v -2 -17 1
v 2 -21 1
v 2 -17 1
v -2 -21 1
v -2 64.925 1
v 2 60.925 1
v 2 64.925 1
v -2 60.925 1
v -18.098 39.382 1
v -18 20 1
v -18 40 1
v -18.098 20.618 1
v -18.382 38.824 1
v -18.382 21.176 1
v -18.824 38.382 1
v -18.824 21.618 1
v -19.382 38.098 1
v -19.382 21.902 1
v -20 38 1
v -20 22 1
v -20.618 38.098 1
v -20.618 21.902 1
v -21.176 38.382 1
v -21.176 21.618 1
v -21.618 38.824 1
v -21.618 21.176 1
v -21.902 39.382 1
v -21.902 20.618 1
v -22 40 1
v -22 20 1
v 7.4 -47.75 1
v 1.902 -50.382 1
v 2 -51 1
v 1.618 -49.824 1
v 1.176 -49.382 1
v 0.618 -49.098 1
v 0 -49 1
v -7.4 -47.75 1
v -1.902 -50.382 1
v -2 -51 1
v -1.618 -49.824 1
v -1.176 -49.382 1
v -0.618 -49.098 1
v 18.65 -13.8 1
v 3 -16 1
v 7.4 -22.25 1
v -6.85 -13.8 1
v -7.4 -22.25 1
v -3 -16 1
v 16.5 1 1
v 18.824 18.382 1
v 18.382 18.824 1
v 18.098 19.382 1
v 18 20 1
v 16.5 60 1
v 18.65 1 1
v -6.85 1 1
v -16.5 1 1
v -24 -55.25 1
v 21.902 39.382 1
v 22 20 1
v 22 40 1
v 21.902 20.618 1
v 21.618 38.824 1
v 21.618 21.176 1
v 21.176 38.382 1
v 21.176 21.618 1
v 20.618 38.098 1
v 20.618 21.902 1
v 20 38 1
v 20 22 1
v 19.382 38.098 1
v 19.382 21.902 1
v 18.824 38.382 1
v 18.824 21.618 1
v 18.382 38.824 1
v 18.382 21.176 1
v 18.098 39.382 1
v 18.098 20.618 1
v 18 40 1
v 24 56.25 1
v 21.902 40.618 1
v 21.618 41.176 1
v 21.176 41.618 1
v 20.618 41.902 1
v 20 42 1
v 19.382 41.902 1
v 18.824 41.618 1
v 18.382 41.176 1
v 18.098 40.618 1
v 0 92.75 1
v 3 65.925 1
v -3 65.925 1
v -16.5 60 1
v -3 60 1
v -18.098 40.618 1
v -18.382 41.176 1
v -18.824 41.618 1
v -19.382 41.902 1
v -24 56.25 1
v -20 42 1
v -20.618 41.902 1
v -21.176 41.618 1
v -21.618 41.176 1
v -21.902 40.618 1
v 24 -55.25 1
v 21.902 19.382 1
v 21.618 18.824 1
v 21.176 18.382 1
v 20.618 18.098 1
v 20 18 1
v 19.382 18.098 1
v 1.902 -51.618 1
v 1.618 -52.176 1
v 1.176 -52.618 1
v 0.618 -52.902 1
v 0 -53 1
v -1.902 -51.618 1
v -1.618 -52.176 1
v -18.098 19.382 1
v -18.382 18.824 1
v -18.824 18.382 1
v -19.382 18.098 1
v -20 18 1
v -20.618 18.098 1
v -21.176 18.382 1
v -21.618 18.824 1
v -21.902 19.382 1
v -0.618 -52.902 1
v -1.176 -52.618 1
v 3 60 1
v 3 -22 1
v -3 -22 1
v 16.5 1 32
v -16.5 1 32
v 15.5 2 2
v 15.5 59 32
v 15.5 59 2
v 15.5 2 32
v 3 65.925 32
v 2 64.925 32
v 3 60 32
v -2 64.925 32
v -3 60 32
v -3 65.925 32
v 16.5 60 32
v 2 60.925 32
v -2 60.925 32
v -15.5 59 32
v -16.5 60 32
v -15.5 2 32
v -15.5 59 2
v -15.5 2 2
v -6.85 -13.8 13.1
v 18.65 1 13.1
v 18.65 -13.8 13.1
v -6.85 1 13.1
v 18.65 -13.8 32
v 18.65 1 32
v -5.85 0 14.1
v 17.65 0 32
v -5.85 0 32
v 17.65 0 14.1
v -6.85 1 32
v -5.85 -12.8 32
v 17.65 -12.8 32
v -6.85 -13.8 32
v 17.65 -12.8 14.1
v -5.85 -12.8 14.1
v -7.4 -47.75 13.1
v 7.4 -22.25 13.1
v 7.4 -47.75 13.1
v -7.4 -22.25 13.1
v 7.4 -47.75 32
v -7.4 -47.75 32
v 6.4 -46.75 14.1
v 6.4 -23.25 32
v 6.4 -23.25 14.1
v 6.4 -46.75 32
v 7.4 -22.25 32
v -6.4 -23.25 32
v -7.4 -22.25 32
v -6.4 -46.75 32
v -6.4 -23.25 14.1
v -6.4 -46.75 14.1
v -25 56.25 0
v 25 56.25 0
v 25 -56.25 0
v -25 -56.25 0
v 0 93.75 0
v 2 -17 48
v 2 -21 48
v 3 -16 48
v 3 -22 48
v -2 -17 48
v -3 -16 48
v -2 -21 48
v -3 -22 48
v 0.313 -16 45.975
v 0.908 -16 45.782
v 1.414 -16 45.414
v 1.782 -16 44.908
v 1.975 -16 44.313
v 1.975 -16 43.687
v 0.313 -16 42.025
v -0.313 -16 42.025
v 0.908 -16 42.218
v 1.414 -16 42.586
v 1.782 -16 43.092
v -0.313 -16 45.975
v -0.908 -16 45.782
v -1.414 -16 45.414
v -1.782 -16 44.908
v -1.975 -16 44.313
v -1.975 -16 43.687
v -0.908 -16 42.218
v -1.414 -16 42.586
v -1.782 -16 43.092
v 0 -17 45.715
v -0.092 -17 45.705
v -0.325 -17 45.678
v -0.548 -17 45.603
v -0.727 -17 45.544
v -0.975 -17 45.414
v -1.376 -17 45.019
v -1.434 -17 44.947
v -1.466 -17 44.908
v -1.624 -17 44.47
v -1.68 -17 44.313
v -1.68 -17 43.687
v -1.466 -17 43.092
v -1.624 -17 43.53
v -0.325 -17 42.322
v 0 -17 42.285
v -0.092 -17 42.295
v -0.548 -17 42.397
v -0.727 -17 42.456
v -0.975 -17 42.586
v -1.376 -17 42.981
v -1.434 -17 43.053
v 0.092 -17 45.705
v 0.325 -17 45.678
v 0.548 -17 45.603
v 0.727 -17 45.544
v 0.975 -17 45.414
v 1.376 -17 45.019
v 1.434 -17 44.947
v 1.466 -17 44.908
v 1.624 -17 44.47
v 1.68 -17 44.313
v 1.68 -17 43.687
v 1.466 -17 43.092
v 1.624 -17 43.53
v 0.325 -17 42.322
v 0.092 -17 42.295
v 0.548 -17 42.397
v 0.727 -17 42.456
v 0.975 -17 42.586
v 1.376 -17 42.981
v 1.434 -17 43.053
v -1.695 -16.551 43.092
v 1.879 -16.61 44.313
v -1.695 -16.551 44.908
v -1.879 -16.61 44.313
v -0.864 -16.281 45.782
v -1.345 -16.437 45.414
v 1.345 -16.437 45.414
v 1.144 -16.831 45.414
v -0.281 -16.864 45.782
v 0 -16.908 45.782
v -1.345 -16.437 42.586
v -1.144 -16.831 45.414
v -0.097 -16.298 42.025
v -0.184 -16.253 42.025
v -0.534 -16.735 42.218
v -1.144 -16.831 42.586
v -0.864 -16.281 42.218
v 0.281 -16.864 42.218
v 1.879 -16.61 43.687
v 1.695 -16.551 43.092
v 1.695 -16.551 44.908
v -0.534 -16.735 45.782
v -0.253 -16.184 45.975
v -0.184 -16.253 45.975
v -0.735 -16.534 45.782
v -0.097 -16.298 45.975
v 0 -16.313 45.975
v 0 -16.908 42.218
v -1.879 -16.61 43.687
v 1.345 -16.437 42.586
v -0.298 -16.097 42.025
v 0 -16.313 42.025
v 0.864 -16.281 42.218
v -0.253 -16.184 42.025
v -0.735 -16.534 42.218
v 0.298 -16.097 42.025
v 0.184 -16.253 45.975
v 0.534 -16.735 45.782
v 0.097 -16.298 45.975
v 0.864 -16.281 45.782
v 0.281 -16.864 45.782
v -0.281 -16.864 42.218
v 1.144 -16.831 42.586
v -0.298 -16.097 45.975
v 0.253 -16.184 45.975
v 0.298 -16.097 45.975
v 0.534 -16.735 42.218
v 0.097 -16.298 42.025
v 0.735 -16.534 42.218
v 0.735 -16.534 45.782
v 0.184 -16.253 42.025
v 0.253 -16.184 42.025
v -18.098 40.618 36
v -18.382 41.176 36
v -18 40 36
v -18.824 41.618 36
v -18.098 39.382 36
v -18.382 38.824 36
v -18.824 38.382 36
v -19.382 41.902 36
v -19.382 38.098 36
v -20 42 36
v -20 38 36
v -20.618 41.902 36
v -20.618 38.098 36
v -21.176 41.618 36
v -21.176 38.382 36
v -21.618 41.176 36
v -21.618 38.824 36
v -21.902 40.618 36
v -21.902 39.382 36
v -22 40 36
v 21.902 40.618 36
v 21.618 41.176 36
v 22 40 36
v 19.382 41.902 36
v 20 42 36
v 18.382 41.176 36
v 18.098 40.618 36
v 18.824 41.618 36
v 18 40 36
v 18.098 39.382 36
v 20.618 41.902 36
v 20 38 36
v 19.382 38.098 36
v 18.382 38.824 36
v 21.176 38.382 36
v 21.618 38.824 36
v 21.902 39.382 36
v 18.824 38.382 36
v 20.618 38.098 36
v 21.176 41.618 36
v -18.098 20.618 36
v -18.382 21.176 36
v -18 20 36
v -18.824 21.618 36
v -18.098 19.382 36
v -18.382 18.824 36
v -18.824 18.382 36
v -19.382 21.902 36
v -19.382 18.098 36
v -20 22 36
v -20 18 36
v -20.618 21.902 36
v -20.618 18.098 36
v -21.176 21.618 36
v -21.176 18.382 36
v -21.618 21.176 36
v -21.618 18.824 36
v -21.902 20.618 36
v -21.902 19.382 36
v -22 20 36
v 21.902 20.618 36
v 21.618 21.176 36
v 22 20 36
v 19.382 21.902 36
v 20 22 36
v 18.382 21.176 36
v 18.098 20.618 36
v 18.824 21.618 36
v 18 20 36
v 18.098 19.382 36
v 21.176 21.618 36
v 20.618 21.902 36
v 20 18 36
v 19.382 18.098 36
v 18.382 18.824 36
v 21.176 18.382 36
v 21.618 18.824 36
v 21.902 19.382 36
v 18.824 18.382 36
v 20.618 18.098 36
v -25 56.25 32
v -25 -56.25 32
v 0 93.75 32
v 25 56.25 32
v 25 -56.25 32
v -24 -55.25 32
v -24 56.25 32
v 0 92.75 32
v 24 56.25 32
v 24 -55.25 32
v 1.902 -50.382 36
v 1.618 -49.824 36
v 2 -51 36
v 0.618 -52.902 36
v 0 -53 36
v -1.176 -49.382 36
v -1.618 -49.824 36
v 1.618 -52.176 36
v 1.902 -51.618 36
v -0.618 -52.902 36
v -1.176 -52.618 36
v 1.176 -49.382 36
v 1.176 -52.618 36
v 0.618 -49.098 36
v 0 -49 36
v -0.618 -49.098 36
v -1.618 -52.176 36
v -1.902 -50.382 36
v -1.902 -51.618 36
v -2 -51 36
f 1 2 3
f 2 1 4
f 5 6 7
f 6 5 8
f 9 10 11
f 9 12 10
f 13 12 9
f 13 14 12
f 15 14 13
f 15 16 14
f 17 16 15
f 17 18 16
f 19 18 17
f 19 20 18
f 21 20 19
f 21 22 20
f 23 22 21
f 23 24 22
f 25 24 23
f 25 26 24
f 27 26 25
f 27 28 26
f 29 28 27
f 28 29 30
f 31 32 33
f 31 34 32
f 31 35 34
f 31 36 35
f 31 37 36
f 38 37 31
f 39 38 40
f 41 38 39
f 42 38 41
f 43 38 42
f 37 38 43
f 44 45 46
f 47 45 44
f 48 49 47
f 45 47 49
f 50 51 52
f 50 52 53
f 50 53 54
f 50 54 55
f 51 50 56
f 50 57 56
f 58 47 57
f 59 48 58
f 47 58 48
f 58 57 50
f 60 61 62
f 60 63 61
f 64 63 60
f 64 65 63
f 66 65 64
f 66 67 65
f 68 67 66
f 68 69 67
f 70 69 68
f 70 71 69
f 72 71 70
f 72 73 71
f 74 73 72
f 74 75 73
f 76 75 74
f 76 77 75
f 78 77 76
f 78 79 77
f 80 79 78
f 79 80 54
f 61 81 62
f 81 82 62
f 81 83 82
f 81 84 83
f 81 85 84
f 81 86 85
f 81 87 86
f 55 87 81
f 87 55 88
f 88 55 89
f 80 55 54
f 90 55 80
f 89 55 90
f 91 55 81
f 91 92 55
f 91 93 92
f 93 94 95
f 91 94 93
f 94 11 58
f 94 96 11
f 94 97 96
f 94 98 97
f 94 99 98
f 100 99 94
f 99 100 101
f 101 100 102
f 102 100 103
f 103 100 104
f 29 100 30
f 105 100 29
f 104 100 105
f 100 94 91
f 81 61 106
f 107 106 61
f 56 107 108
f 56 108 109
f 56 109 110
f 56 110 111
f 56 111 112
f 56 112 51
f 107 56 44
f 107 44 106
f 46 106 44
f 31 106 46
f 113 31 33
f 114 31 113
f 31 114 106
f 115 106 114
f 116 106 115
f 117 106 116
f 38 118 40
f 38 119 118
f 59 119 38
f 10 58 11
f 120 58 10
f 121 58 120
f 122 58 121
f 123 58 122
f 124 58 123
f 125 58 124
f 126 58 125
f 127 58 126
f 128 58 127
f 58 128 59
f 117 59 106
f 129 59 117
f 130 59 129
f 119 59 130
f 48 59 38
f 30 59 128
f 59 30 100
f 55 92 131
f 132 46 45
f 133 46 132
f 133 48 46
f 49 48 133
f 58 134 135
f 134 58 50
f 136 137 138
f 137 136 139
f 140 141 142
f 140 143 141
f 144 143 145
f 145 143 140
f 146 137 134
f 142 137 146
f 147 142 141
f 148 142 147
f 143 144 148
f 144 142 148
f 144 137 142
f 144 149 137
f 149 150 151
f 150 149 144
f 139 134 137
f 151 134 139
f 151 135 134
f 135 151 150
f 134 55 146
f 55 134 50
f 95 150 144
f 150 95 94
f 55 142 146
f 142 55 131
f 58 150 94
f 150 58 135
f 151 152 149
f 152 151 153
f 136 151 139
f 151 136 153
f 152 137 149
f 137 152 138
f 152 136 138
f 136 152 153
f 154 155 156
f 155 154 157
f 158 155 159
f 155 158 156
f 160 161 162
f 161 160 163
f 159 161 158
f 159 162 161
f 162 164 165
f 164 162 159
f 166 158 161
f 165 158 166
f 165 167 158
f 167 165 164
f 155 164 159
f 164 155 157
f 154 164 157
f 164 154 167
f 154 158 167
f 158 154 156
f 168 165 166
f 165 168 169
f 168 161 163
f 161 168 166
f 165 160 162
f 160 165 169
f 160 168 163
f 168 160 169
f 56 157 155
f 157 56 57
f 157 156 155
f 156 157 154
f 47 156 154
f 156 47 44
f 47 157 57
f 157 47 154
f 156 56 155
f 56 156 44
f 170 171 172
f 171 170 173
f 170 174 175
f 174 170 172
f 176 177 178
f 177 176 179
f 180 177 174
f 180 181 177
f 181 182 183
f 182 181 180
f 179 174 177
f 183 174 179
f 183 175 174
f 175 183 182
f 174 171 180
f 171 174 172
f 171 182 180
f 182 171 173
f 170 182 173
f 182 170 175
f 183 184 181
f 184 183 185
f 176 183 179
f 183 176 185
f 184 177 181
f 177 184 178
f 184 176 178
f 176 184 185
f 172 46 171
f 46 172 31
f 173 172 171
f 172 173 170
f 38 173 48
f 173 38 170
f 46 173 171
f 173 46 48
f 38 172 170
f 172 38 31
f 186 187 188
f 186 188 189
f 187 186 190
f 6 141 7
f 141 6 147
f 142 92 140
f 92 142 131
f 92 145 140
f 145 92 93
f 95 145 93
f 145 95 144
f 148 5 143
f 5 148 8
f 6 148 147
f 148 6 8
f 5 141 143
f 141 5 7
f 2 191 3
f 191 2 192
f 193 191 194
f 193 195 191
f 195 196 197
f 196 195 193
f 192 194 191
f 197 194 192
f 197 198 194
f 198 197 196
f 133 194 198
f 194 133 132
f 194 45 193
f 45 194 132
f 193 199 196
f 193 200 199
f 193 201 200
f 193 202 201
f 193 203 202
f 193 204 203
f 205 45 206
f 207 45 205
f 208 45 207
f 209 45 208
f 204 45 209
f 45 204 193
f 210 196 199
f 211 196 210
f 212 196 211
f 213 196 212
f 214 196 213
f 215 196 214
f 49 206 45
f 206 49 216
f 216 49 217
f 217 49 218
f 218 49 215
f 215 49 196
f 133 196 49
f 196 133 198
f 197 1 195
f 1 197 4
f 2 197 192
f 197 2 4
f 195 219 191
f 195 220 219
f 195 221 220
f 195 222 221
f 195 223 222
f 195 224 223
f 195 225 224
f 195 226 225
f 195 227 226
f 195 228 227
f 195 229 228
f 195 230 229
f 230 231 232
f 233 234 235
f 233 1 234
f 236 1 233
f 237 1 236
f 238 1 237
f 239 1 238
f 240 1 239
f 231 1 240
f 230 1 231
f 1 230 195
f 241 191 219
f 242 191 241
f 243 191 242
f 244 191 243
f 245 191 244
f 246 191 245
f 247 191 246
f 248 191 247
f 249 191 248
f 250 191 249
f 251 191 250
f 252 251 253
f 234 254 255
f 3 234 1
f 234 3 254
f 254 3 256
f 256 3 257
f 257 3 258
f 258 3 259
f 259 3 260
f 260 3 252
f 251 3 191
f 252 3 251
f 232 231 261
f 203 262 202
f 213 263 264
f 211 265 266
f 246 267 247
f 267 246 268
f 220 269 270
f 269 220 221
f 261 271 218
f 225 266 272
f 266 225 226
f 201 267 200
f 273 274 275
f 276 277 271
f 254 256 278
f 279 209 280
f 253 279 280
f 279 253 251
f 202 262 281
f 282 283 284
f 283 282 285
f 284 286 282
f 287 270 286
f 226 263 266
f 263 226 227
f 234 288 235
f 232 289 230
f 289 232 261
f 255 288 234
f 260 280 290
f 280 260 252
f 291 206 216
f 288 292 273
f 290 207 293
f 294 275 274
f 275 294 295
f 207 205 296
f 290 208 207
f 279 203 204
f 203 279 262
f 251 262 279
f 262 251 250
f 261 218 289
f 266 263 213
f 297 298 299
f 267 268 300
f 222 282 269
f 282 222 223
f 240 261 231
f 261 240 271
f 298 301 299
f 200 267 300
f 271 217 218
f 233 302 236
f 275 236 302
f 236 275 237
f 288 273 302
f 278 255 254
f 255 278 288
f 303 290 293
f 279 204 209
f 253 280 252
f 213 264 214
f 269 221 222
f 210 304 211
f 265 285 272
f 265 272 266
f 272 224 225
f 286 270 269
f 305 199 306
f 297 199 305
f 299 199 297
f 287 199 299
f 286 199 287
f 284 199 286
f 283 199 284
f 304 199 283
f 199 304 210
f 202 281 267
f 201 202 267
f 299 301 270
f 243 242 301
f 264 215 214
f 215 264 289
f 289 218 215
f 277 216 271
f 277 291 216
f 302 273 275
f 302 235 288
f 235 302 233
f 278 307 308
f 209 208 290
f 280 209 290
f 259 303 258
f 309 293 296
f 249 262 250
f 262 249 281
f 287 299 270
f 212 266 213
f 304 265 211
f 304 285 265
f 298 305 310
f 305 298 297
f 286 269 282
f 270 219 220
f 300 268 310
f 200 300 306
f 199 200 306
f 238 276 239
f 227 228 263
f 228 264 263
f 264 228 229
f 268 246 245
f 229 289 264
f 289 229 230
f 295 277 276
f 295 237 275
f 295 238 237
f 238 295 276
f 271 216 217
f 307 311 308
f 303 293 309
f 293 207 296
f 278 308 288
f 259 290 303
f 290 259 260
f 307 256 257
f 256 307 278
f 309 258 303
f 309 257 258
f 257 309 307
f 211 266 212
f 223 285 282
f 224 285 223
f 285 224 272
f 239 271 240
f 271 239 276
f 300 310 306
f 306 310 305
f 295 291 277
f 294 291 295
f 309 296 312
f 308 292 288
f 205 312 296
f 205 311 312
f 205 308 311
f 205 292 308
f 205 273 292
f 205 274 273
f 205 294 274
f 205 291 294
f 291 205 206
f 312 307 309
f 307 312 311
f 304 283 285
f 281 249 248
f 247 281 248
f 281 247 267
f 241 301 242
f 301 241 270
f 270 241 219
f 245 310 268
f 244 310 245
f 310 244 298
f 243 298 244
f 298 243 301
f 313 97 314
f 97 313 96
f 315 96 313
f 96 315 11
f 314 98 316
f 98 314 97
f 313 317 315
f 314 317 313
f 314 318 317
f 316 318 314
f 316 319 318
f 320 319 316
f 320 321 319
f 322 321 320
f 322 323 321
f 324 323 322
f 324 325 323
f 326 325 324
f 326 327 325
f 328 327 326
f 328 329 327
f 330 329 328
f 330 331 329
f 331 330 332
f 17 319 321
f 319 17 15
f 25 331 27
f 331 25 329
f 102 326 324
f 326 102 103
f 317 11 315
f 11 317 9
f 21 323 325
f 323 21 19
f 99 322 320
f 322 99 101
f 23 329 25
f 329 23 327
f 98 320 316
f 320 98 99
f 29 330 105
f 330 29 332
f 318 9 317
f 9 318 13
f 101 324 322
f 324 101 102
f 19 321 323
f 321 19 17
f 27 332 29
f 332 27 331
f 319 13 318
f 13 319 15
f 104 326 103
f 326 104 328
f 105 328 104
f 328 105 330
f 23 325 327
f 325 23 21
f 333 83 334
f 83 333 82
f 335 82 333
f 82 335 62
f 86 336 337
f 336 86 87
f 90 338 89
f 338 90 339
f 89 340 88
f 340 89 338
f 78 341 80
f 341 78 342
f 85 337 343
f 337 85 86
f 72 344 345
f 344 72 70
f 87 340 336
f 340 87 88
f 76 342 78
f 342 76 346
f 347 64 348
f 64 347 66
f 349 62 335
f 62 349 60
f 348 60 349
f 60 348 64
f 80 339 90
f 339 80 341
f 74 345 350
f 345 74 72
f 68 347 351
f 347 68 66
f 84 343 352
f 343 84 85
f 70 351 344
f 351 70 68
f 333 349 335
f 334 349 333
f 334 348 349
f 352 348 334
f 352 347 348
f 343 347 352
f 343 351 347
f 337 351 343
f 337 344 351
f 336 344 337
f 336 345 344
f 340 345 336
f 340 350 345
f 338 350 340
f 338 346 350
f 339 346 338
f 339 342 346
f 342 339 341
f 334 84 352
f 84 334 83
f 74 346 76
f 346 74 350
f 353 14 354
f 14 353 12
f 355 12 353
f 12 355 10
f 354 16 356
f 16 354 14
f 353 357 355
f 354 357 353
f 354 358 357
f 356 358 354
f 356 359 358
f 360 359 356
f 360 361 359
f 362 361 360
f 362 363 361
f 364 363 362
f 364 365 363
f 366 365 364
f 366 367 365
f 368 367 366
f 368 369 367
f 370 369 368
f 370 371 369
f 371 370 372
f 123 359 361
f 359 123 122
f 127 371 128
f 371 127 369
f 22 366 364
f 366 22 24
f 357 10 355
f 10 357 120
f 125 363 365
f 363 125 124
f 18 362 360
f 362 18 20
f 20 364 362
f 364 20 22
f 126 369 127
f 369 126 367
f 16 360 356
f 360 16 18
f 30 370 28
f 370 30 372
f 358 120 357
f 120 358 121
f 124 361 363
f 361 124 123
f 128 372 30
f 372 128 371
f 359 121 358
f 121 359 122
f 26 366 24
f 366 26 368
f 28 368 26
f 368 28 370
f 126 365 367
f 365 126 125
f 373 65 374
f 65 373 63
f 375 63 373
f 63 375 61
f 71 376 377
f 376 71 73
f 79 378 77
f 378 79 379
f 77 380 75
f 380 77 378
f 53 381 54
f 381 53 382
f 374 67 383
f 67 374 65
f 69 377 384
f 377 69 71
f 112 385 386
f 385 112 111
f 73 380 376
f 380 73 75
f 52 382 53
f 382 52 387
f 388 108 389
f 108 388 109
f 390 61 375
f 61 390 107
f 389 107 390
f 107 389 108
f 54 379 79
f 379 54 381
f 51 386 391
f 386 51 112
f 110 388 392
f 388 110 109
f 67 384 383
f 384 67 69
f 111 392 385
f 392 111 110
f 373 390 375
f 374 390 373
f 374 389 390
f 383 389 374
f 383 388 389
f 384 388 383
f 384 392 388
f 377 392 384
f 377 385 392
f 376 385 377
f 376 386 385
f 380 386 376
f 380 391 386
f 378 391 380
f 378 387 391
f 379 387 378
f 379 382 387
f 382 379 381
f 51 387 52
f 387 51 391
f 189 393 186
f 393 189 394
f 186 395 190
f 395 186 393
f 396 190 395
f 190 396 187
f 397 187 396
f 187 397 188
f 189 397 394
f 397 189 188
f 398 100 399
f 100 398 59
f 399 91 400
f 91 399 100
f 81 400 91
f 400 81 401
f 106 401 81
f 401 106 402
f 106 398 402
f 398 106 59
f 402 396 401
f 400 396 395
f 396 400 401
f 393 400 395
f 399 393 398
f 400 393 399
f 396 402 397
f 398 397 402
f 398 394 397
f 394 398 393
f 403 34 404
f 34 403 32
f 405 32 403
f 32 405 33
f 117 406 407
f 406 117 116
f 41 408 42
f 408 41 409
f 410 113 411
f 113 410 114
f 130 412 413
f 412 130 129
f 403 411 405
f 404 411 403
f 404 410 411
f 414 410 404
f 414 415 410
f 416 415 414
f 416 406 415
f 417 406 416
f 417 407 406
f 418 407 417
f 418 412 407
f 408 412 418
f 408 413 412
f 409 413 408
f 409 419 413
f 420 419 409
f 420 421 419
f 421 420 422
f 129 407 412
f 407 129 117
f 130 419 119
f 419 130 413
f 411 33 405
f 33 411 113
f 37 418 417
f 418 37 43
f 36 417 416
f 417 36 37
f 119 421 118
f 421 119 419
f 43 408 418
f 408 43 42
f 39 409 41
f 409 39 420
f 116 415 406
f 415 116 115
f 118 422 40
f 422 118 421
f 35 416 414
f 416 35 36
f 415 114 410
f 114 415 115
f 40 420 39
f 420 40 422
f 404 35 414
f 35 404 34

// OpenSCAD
BOAT_WIDTH = 50;
BOAT_LENGTH = 150;
BOAT_DEPTH = 32;
HULL_THICKNESS = 1;

BATTERY_SIZE_PADDING = 2;
BATTERY_INNER_WIDTH = 30 + BATTERY_SIZE_PADDING;
BATTERY_INNER_LENGTH = 56 + BATTERY_SIZE_PADDING;
BATTERY_INNER_HEIGHT = 28 + BATTERY_SIZE_PADDING;
BATTERY_BOX_THICKNESS = 1;

SERVO_SIZE_PADDING = 2;
SERVO_INNER_WIDTH = 11.8 + SERVO_SIZE_PADDING;
SERVO_INNER_LENGTH = 22.5 + SERVO_SIZE_PADDING;
SERVO_INNER_HEIGHT = 15.9 + SERVO_SIZE_PADDING;
SERVO_BOX_THICKNESS = 1;

MAST_HOLE_SIZE = 6;

hull();
batteryBox();
sailServo();
rudderServo();
rudderMount();
mastMount();
mainSheetRing();
pegs();

module hull() {
  aftLength = BOAT_LENGTH * .75;
  foreLength = BOAT_LENGTH - aftLength;
  polyhedron(
    points = [
      // Underside
      [0, aftLength/2 + foreLength, 0],
      [-BOAT_WIDTH/2, aftLength/2, 0],
      [-BOAT_WIDTH/2, -aftLength/2, 0],
      [BOAT_WIDTH/2, -aftLength/2, 0],
      [BOAT_WIDTH/2, aftLength/2, 0],

      // Top outside
      [0, aftLength/2 + foreLength, BOAT_DEPTH],
      [-BOAT_WIDTH/2, aftLength/2, BOAT_DEPTH],
      [-BOAT_WIDTH/2, -aftLength/2, BOAT_DEPTH],
      [BOAT_WIDTH/2, -aftLength/2, BOAT_DEPTH],
      [BOAT_WIDTH/2, aftLength/2, BOAT_DEPTH],

      // Top inside
      [0, aftLength/2 + foreLength - HULL_THICKNESS, BOAT_DEPTH],
      [-BOAT_WIDTH/2+HULL_THICKNESS, aftLength/2, BOAT_DEPTH],
      [-BOAT_WIDTH/2+HULL_THICKNESS, HULL_THICKNESS-aftLength/2, BOAT_DEPTH],
      [BOAT_WIDTH/2-HULL_THICKNESS, HULL_THICKNESS-aftLength/2, BOAT_DEPTH],
      [BOAT_WIDTH/2-HULL_THICKNESS, aftLength/2, BOAT_DEPTH],

      // Floor
      [0, aftLength/2 + foreLength - HULL_THICKNESS, HULL_THICKNESS],
      [-BOAT_WIDTH/2+HULL_THICKNESS, aftLength/2, HULL_THICKNESS],
      [-BOAT_WIDTH/2+HULL_THICKNESS, HULL_THICKNESS-aftLength/2, HULL_THICKNESS],
      [BOAT_WIDTH/2-HULL_THICKNESS, HULL_THICKNESS-aftLength/2, HULL_THICKNESS],
      [BOAT_WIDTH/2-HULL_THICKNESS, aftLength/2, HULL_THICKNESS],
    ],
    triangles = [
      // Underside
      [3, 1, 2],
      [3, 4, 1],
      [1, 4, 0],

      // Outer Walls
      [2, 1, 7],
      [7, 1, 6],
      [1, 0, 6],
      [6, 0, 5],
      [0, 4, 5],
      [5, 4, 9],
      [4, 3, 8],
      [8, 9, 4],
      [3, 2, 7],
      [3, 7, 8],

      // Inner Walls
      [12, 11, 17],
      [17, 11, 16],
      [11, 10, 16],
      [16, 10, 15],
      [10, 14, 15],
      [15, 14, 19],
      [14, 13, 18],
      [18, 19, 14],
      [13, 12, 17],
      [13, 17, 18],
      
      // Top of railing
      [8, 14, 9],
      [8, 13, 14],
      [9, 14, 10],
      [9, 10, 5],
      [5, 11, 6],
      [5, 10, 11],
      [7, 6, 11],
      [7, 11, 12],
      [7, 13, 8],
      [7, 12, 13],

      // Floor
      [18, 17, 16],
      [18, 16, 19],
      [16, 15, 19],
    ]
  );
}

module oldHull() {
  aftLength = BOAT_LENGTH * .75;
  foreLength = BOAT_LENGTH - aftLength;
  openTopBox(BOAT_WIDTH, aftLength, BOAT_DEPTH, HULL_THICKNESS, 0);
  polyhedron(
    points = [
      // Bottom of triangle (floor)
      [BOAT_WIDTH/2, aftLength/2, 0],
      [-BOAT_WIDTH/2, aftLength/2, 0],
      [0, aftLength/2 + foreLength, 0],

      // Top of triangle (floor)
      [BOAT_WIDTH/2, aftLength/2, HULL_THICKNESS],
      [-BOAT_WIDTH/2, aftLength/2, HULL_THICKNESS],
      [0, aftLength/2 + foreLength, HULL_THICKNESS],

      // Top outside of walls
      [BOAT_WIDTH/2, aftLength/2, BOAT_DEPTH],
      [-BOAT_WIDTH/2, aftLength/2, BOAT_DEPTH],
      [0, aftLength/2 + foreLength, BOAT_DEPTH],

      // Top inside of walls
      [BOAT_WIDTH/2-HULL_THICKNESS, aftLength/2, BOAT_DEPTH],
      [-BOAT_WIDTH/2+HULL_THICKNESS, aftLength/2, BOAT_DEPTH],
      [0, aftLength/2 + foreLength -HULL_THICKNESS, BOAT_DEPTH],

      // Bottom inside of walls
      [BOAT_WIDTH/2-HULL_THICKNESS, aftLength/2, HULL_THICKNESS],
      [-BOAT_WIDTH/2+HULL_THICKNESS, aftLength/2, HULL_THICKNESS],
      [0, aftLength/2 + foreLength -HULL_THICKNESS, HULL_THICKNESS],
    ],
    triangles = [
      // Triangles
      [0, 1, 2],
      [3, 4, 5],
      // Outer walls
      [1, 2, 7],
      [2, 8, 7],
      [2, 0, 8],
      [0, 6, 8],
      // Inner walls
      [10, 11, 13],
      [11, 14, 13],
      [11, 9, 14],
      [9, 12, 14],
      // Top of walls
      [6, 9, 11],
      [11, 8, 6],
      [10, 7, 11],
      [11, 7, 8],
      // Wall edges
      [3, 12, 9],
      [3, 9, 6],
      [4, 10, 13],
      [4, 7, 10],
      // Floor edge
      [0, 1, 3],
      [3, 1, 4],
    ]
  );
}

module batteryBox() {
  color("red") {
    translate([0, 30.5, HULL_THICKNESS]) {
      openTopBox(BATTERY_INNER_WIDTH+BATTERY_BOX_THICKNESS, BATTERY_INNER_LENGTH+BATTERY_BOX_THICKNESS, BATTERY_INNER_HEIGHT+BATTERY_BOX_THICKNESS, BATTERY_BOX_THICKNESS);
    }
  }
}

module servoBox() {
  servoOuterHeight = SERVO_INNER_HEIGHT + SERVO_BOX_THICKNESS;
  color("blue") {
    translate([0, 0, BOAT_DEPTH-SERVO_INNER_HEIGHT-HULL_THICKNESS]) {
      openTopBox(SERVO_INNER_WIDTH+SERVO_BOX_THICKNESS, SERVO_INNER_LENGTH+SERVO_BOX_THICKNESS, servoOuterHeight, SERVO_BOX_THICKNESS);
    }
    translate([0, 0, (HULL_THICKNESS+BOAT_DEPTH-servoOuterHeight)/2]) {
      cube([SERVO_INNER_WIDTH+SERVO_BOX_THICKNESS, SERVO_INNER_LENGTH+SERVO_BOX_THICKNESS, BOAT_DEPTH-servoOuterHeight-HULL_THICKNESS], true);
    }
  }
}

module sailServo() {
  translate([5.9, -6.4, 0]) {
    rotate([0, 0, 90]) {
      servoBox();
    }
  }
}

module rudderServo() {
  translate([0, -35, 0]) {
    servoBox();
  }
}

module rudderMount() {
  translate([0, -51, 0]) {
    peg();
  }
}

module mastMount() {
  translate([0, BOAT_LENGTH*7/16 - 2.7, 0]) {
    color("orange") {
      openTopBox(MAST_HOLE_SIZE, MAST_HOLE_SIZE, BOAT_DEPTH);
    }
  }
}

module mainSheetRing() {
  translate([0, -19, 0]) {
    color("orange") {
      difference() {
        openTopBox(MAST_HOLE_SIZE, MAST_HOLE_SIZE, BOAT_DEPTH+16);
        translate([0, MAST_HOLE_SIZE/2, BOAT_DEPTH+12]) {
          sphere(MAST_HOLE_SIZE/3, $fn=20);
        }
      }
    }
  }
}

module peg() {
  color("orange") {
    cylinder($fn=20, BOAT_DEPTH+4, 2, 2);
  }
}

module pegs() {
  translate([-20, 40, 0]) {
    peg();
  }
  translate([20, 40, 0]) {
    peg();
  }
  translate([-20, 20, 0]) {
    peg();
  }
  translate([20, 20, 0]) {
    peg();
  }
}

// Makes a box with the given outer dimensions but no top
module openTopBox(w, d, h, thickness=1.0, includeFrontWall=true) {
  translate([(w-thickness)/2, 0, 0]) {
    wall(d, h, 90, thickness);
  }
  translate([(w-thickness)/-2, 0, 0]) {
    wall(d, h, 90, thickness);
  }
  translate([0, (d-thickness)/-2, 0]) {
    wall(w, h, 0, thickness);
  }
  if (includeFrontWall) {
    translate([0, (d-thickness)/2, 0]) {
      wall(w, h, 0, thickness);
    }
  }
  // Floor
  translate([0, d/2, thickness/2]) {
    rotate([90, 0, 0]) {
      wall(w, d, 0, thickness);
    }
  }
}

// Makes a wall (a closed box) with specified width, height
// Origin will be on the floor, in the middle of the box
module wall(w, h, r=0.0, thickness=1.0) {
  rotate([0, 0, r]) {
  polyhedron(
    points = [
      [-w/2, -thickness/2, 0], // 0
      [w/2, -thickness/2, 0],  // 1
      [w/2, thickness/2, 0],   // 2
      [-w/2, thickness/2, 0],  // 3
      [-w/2, -thickness/2, h], // 4
      [w/2, -thickness/2, h],  // 5
      [w/2, thickness/2, h],   // 6
      [-w/2, thickness/2, h],  // 7
    ],
    triangles = [
      [0, 1, 2],
      [2, 3, 0],
      [4, 6, 5],
      [6, 4, 7],
      [0, 4, 1],
      [4, 5, 1],
      [2, 6, 3],
      [6, 7, 3],
      [0, 3, 4],
      [4, 3, 7],
      [1, 5, 2],
      [5, 6, 2],
    ]
  );
  }
}
